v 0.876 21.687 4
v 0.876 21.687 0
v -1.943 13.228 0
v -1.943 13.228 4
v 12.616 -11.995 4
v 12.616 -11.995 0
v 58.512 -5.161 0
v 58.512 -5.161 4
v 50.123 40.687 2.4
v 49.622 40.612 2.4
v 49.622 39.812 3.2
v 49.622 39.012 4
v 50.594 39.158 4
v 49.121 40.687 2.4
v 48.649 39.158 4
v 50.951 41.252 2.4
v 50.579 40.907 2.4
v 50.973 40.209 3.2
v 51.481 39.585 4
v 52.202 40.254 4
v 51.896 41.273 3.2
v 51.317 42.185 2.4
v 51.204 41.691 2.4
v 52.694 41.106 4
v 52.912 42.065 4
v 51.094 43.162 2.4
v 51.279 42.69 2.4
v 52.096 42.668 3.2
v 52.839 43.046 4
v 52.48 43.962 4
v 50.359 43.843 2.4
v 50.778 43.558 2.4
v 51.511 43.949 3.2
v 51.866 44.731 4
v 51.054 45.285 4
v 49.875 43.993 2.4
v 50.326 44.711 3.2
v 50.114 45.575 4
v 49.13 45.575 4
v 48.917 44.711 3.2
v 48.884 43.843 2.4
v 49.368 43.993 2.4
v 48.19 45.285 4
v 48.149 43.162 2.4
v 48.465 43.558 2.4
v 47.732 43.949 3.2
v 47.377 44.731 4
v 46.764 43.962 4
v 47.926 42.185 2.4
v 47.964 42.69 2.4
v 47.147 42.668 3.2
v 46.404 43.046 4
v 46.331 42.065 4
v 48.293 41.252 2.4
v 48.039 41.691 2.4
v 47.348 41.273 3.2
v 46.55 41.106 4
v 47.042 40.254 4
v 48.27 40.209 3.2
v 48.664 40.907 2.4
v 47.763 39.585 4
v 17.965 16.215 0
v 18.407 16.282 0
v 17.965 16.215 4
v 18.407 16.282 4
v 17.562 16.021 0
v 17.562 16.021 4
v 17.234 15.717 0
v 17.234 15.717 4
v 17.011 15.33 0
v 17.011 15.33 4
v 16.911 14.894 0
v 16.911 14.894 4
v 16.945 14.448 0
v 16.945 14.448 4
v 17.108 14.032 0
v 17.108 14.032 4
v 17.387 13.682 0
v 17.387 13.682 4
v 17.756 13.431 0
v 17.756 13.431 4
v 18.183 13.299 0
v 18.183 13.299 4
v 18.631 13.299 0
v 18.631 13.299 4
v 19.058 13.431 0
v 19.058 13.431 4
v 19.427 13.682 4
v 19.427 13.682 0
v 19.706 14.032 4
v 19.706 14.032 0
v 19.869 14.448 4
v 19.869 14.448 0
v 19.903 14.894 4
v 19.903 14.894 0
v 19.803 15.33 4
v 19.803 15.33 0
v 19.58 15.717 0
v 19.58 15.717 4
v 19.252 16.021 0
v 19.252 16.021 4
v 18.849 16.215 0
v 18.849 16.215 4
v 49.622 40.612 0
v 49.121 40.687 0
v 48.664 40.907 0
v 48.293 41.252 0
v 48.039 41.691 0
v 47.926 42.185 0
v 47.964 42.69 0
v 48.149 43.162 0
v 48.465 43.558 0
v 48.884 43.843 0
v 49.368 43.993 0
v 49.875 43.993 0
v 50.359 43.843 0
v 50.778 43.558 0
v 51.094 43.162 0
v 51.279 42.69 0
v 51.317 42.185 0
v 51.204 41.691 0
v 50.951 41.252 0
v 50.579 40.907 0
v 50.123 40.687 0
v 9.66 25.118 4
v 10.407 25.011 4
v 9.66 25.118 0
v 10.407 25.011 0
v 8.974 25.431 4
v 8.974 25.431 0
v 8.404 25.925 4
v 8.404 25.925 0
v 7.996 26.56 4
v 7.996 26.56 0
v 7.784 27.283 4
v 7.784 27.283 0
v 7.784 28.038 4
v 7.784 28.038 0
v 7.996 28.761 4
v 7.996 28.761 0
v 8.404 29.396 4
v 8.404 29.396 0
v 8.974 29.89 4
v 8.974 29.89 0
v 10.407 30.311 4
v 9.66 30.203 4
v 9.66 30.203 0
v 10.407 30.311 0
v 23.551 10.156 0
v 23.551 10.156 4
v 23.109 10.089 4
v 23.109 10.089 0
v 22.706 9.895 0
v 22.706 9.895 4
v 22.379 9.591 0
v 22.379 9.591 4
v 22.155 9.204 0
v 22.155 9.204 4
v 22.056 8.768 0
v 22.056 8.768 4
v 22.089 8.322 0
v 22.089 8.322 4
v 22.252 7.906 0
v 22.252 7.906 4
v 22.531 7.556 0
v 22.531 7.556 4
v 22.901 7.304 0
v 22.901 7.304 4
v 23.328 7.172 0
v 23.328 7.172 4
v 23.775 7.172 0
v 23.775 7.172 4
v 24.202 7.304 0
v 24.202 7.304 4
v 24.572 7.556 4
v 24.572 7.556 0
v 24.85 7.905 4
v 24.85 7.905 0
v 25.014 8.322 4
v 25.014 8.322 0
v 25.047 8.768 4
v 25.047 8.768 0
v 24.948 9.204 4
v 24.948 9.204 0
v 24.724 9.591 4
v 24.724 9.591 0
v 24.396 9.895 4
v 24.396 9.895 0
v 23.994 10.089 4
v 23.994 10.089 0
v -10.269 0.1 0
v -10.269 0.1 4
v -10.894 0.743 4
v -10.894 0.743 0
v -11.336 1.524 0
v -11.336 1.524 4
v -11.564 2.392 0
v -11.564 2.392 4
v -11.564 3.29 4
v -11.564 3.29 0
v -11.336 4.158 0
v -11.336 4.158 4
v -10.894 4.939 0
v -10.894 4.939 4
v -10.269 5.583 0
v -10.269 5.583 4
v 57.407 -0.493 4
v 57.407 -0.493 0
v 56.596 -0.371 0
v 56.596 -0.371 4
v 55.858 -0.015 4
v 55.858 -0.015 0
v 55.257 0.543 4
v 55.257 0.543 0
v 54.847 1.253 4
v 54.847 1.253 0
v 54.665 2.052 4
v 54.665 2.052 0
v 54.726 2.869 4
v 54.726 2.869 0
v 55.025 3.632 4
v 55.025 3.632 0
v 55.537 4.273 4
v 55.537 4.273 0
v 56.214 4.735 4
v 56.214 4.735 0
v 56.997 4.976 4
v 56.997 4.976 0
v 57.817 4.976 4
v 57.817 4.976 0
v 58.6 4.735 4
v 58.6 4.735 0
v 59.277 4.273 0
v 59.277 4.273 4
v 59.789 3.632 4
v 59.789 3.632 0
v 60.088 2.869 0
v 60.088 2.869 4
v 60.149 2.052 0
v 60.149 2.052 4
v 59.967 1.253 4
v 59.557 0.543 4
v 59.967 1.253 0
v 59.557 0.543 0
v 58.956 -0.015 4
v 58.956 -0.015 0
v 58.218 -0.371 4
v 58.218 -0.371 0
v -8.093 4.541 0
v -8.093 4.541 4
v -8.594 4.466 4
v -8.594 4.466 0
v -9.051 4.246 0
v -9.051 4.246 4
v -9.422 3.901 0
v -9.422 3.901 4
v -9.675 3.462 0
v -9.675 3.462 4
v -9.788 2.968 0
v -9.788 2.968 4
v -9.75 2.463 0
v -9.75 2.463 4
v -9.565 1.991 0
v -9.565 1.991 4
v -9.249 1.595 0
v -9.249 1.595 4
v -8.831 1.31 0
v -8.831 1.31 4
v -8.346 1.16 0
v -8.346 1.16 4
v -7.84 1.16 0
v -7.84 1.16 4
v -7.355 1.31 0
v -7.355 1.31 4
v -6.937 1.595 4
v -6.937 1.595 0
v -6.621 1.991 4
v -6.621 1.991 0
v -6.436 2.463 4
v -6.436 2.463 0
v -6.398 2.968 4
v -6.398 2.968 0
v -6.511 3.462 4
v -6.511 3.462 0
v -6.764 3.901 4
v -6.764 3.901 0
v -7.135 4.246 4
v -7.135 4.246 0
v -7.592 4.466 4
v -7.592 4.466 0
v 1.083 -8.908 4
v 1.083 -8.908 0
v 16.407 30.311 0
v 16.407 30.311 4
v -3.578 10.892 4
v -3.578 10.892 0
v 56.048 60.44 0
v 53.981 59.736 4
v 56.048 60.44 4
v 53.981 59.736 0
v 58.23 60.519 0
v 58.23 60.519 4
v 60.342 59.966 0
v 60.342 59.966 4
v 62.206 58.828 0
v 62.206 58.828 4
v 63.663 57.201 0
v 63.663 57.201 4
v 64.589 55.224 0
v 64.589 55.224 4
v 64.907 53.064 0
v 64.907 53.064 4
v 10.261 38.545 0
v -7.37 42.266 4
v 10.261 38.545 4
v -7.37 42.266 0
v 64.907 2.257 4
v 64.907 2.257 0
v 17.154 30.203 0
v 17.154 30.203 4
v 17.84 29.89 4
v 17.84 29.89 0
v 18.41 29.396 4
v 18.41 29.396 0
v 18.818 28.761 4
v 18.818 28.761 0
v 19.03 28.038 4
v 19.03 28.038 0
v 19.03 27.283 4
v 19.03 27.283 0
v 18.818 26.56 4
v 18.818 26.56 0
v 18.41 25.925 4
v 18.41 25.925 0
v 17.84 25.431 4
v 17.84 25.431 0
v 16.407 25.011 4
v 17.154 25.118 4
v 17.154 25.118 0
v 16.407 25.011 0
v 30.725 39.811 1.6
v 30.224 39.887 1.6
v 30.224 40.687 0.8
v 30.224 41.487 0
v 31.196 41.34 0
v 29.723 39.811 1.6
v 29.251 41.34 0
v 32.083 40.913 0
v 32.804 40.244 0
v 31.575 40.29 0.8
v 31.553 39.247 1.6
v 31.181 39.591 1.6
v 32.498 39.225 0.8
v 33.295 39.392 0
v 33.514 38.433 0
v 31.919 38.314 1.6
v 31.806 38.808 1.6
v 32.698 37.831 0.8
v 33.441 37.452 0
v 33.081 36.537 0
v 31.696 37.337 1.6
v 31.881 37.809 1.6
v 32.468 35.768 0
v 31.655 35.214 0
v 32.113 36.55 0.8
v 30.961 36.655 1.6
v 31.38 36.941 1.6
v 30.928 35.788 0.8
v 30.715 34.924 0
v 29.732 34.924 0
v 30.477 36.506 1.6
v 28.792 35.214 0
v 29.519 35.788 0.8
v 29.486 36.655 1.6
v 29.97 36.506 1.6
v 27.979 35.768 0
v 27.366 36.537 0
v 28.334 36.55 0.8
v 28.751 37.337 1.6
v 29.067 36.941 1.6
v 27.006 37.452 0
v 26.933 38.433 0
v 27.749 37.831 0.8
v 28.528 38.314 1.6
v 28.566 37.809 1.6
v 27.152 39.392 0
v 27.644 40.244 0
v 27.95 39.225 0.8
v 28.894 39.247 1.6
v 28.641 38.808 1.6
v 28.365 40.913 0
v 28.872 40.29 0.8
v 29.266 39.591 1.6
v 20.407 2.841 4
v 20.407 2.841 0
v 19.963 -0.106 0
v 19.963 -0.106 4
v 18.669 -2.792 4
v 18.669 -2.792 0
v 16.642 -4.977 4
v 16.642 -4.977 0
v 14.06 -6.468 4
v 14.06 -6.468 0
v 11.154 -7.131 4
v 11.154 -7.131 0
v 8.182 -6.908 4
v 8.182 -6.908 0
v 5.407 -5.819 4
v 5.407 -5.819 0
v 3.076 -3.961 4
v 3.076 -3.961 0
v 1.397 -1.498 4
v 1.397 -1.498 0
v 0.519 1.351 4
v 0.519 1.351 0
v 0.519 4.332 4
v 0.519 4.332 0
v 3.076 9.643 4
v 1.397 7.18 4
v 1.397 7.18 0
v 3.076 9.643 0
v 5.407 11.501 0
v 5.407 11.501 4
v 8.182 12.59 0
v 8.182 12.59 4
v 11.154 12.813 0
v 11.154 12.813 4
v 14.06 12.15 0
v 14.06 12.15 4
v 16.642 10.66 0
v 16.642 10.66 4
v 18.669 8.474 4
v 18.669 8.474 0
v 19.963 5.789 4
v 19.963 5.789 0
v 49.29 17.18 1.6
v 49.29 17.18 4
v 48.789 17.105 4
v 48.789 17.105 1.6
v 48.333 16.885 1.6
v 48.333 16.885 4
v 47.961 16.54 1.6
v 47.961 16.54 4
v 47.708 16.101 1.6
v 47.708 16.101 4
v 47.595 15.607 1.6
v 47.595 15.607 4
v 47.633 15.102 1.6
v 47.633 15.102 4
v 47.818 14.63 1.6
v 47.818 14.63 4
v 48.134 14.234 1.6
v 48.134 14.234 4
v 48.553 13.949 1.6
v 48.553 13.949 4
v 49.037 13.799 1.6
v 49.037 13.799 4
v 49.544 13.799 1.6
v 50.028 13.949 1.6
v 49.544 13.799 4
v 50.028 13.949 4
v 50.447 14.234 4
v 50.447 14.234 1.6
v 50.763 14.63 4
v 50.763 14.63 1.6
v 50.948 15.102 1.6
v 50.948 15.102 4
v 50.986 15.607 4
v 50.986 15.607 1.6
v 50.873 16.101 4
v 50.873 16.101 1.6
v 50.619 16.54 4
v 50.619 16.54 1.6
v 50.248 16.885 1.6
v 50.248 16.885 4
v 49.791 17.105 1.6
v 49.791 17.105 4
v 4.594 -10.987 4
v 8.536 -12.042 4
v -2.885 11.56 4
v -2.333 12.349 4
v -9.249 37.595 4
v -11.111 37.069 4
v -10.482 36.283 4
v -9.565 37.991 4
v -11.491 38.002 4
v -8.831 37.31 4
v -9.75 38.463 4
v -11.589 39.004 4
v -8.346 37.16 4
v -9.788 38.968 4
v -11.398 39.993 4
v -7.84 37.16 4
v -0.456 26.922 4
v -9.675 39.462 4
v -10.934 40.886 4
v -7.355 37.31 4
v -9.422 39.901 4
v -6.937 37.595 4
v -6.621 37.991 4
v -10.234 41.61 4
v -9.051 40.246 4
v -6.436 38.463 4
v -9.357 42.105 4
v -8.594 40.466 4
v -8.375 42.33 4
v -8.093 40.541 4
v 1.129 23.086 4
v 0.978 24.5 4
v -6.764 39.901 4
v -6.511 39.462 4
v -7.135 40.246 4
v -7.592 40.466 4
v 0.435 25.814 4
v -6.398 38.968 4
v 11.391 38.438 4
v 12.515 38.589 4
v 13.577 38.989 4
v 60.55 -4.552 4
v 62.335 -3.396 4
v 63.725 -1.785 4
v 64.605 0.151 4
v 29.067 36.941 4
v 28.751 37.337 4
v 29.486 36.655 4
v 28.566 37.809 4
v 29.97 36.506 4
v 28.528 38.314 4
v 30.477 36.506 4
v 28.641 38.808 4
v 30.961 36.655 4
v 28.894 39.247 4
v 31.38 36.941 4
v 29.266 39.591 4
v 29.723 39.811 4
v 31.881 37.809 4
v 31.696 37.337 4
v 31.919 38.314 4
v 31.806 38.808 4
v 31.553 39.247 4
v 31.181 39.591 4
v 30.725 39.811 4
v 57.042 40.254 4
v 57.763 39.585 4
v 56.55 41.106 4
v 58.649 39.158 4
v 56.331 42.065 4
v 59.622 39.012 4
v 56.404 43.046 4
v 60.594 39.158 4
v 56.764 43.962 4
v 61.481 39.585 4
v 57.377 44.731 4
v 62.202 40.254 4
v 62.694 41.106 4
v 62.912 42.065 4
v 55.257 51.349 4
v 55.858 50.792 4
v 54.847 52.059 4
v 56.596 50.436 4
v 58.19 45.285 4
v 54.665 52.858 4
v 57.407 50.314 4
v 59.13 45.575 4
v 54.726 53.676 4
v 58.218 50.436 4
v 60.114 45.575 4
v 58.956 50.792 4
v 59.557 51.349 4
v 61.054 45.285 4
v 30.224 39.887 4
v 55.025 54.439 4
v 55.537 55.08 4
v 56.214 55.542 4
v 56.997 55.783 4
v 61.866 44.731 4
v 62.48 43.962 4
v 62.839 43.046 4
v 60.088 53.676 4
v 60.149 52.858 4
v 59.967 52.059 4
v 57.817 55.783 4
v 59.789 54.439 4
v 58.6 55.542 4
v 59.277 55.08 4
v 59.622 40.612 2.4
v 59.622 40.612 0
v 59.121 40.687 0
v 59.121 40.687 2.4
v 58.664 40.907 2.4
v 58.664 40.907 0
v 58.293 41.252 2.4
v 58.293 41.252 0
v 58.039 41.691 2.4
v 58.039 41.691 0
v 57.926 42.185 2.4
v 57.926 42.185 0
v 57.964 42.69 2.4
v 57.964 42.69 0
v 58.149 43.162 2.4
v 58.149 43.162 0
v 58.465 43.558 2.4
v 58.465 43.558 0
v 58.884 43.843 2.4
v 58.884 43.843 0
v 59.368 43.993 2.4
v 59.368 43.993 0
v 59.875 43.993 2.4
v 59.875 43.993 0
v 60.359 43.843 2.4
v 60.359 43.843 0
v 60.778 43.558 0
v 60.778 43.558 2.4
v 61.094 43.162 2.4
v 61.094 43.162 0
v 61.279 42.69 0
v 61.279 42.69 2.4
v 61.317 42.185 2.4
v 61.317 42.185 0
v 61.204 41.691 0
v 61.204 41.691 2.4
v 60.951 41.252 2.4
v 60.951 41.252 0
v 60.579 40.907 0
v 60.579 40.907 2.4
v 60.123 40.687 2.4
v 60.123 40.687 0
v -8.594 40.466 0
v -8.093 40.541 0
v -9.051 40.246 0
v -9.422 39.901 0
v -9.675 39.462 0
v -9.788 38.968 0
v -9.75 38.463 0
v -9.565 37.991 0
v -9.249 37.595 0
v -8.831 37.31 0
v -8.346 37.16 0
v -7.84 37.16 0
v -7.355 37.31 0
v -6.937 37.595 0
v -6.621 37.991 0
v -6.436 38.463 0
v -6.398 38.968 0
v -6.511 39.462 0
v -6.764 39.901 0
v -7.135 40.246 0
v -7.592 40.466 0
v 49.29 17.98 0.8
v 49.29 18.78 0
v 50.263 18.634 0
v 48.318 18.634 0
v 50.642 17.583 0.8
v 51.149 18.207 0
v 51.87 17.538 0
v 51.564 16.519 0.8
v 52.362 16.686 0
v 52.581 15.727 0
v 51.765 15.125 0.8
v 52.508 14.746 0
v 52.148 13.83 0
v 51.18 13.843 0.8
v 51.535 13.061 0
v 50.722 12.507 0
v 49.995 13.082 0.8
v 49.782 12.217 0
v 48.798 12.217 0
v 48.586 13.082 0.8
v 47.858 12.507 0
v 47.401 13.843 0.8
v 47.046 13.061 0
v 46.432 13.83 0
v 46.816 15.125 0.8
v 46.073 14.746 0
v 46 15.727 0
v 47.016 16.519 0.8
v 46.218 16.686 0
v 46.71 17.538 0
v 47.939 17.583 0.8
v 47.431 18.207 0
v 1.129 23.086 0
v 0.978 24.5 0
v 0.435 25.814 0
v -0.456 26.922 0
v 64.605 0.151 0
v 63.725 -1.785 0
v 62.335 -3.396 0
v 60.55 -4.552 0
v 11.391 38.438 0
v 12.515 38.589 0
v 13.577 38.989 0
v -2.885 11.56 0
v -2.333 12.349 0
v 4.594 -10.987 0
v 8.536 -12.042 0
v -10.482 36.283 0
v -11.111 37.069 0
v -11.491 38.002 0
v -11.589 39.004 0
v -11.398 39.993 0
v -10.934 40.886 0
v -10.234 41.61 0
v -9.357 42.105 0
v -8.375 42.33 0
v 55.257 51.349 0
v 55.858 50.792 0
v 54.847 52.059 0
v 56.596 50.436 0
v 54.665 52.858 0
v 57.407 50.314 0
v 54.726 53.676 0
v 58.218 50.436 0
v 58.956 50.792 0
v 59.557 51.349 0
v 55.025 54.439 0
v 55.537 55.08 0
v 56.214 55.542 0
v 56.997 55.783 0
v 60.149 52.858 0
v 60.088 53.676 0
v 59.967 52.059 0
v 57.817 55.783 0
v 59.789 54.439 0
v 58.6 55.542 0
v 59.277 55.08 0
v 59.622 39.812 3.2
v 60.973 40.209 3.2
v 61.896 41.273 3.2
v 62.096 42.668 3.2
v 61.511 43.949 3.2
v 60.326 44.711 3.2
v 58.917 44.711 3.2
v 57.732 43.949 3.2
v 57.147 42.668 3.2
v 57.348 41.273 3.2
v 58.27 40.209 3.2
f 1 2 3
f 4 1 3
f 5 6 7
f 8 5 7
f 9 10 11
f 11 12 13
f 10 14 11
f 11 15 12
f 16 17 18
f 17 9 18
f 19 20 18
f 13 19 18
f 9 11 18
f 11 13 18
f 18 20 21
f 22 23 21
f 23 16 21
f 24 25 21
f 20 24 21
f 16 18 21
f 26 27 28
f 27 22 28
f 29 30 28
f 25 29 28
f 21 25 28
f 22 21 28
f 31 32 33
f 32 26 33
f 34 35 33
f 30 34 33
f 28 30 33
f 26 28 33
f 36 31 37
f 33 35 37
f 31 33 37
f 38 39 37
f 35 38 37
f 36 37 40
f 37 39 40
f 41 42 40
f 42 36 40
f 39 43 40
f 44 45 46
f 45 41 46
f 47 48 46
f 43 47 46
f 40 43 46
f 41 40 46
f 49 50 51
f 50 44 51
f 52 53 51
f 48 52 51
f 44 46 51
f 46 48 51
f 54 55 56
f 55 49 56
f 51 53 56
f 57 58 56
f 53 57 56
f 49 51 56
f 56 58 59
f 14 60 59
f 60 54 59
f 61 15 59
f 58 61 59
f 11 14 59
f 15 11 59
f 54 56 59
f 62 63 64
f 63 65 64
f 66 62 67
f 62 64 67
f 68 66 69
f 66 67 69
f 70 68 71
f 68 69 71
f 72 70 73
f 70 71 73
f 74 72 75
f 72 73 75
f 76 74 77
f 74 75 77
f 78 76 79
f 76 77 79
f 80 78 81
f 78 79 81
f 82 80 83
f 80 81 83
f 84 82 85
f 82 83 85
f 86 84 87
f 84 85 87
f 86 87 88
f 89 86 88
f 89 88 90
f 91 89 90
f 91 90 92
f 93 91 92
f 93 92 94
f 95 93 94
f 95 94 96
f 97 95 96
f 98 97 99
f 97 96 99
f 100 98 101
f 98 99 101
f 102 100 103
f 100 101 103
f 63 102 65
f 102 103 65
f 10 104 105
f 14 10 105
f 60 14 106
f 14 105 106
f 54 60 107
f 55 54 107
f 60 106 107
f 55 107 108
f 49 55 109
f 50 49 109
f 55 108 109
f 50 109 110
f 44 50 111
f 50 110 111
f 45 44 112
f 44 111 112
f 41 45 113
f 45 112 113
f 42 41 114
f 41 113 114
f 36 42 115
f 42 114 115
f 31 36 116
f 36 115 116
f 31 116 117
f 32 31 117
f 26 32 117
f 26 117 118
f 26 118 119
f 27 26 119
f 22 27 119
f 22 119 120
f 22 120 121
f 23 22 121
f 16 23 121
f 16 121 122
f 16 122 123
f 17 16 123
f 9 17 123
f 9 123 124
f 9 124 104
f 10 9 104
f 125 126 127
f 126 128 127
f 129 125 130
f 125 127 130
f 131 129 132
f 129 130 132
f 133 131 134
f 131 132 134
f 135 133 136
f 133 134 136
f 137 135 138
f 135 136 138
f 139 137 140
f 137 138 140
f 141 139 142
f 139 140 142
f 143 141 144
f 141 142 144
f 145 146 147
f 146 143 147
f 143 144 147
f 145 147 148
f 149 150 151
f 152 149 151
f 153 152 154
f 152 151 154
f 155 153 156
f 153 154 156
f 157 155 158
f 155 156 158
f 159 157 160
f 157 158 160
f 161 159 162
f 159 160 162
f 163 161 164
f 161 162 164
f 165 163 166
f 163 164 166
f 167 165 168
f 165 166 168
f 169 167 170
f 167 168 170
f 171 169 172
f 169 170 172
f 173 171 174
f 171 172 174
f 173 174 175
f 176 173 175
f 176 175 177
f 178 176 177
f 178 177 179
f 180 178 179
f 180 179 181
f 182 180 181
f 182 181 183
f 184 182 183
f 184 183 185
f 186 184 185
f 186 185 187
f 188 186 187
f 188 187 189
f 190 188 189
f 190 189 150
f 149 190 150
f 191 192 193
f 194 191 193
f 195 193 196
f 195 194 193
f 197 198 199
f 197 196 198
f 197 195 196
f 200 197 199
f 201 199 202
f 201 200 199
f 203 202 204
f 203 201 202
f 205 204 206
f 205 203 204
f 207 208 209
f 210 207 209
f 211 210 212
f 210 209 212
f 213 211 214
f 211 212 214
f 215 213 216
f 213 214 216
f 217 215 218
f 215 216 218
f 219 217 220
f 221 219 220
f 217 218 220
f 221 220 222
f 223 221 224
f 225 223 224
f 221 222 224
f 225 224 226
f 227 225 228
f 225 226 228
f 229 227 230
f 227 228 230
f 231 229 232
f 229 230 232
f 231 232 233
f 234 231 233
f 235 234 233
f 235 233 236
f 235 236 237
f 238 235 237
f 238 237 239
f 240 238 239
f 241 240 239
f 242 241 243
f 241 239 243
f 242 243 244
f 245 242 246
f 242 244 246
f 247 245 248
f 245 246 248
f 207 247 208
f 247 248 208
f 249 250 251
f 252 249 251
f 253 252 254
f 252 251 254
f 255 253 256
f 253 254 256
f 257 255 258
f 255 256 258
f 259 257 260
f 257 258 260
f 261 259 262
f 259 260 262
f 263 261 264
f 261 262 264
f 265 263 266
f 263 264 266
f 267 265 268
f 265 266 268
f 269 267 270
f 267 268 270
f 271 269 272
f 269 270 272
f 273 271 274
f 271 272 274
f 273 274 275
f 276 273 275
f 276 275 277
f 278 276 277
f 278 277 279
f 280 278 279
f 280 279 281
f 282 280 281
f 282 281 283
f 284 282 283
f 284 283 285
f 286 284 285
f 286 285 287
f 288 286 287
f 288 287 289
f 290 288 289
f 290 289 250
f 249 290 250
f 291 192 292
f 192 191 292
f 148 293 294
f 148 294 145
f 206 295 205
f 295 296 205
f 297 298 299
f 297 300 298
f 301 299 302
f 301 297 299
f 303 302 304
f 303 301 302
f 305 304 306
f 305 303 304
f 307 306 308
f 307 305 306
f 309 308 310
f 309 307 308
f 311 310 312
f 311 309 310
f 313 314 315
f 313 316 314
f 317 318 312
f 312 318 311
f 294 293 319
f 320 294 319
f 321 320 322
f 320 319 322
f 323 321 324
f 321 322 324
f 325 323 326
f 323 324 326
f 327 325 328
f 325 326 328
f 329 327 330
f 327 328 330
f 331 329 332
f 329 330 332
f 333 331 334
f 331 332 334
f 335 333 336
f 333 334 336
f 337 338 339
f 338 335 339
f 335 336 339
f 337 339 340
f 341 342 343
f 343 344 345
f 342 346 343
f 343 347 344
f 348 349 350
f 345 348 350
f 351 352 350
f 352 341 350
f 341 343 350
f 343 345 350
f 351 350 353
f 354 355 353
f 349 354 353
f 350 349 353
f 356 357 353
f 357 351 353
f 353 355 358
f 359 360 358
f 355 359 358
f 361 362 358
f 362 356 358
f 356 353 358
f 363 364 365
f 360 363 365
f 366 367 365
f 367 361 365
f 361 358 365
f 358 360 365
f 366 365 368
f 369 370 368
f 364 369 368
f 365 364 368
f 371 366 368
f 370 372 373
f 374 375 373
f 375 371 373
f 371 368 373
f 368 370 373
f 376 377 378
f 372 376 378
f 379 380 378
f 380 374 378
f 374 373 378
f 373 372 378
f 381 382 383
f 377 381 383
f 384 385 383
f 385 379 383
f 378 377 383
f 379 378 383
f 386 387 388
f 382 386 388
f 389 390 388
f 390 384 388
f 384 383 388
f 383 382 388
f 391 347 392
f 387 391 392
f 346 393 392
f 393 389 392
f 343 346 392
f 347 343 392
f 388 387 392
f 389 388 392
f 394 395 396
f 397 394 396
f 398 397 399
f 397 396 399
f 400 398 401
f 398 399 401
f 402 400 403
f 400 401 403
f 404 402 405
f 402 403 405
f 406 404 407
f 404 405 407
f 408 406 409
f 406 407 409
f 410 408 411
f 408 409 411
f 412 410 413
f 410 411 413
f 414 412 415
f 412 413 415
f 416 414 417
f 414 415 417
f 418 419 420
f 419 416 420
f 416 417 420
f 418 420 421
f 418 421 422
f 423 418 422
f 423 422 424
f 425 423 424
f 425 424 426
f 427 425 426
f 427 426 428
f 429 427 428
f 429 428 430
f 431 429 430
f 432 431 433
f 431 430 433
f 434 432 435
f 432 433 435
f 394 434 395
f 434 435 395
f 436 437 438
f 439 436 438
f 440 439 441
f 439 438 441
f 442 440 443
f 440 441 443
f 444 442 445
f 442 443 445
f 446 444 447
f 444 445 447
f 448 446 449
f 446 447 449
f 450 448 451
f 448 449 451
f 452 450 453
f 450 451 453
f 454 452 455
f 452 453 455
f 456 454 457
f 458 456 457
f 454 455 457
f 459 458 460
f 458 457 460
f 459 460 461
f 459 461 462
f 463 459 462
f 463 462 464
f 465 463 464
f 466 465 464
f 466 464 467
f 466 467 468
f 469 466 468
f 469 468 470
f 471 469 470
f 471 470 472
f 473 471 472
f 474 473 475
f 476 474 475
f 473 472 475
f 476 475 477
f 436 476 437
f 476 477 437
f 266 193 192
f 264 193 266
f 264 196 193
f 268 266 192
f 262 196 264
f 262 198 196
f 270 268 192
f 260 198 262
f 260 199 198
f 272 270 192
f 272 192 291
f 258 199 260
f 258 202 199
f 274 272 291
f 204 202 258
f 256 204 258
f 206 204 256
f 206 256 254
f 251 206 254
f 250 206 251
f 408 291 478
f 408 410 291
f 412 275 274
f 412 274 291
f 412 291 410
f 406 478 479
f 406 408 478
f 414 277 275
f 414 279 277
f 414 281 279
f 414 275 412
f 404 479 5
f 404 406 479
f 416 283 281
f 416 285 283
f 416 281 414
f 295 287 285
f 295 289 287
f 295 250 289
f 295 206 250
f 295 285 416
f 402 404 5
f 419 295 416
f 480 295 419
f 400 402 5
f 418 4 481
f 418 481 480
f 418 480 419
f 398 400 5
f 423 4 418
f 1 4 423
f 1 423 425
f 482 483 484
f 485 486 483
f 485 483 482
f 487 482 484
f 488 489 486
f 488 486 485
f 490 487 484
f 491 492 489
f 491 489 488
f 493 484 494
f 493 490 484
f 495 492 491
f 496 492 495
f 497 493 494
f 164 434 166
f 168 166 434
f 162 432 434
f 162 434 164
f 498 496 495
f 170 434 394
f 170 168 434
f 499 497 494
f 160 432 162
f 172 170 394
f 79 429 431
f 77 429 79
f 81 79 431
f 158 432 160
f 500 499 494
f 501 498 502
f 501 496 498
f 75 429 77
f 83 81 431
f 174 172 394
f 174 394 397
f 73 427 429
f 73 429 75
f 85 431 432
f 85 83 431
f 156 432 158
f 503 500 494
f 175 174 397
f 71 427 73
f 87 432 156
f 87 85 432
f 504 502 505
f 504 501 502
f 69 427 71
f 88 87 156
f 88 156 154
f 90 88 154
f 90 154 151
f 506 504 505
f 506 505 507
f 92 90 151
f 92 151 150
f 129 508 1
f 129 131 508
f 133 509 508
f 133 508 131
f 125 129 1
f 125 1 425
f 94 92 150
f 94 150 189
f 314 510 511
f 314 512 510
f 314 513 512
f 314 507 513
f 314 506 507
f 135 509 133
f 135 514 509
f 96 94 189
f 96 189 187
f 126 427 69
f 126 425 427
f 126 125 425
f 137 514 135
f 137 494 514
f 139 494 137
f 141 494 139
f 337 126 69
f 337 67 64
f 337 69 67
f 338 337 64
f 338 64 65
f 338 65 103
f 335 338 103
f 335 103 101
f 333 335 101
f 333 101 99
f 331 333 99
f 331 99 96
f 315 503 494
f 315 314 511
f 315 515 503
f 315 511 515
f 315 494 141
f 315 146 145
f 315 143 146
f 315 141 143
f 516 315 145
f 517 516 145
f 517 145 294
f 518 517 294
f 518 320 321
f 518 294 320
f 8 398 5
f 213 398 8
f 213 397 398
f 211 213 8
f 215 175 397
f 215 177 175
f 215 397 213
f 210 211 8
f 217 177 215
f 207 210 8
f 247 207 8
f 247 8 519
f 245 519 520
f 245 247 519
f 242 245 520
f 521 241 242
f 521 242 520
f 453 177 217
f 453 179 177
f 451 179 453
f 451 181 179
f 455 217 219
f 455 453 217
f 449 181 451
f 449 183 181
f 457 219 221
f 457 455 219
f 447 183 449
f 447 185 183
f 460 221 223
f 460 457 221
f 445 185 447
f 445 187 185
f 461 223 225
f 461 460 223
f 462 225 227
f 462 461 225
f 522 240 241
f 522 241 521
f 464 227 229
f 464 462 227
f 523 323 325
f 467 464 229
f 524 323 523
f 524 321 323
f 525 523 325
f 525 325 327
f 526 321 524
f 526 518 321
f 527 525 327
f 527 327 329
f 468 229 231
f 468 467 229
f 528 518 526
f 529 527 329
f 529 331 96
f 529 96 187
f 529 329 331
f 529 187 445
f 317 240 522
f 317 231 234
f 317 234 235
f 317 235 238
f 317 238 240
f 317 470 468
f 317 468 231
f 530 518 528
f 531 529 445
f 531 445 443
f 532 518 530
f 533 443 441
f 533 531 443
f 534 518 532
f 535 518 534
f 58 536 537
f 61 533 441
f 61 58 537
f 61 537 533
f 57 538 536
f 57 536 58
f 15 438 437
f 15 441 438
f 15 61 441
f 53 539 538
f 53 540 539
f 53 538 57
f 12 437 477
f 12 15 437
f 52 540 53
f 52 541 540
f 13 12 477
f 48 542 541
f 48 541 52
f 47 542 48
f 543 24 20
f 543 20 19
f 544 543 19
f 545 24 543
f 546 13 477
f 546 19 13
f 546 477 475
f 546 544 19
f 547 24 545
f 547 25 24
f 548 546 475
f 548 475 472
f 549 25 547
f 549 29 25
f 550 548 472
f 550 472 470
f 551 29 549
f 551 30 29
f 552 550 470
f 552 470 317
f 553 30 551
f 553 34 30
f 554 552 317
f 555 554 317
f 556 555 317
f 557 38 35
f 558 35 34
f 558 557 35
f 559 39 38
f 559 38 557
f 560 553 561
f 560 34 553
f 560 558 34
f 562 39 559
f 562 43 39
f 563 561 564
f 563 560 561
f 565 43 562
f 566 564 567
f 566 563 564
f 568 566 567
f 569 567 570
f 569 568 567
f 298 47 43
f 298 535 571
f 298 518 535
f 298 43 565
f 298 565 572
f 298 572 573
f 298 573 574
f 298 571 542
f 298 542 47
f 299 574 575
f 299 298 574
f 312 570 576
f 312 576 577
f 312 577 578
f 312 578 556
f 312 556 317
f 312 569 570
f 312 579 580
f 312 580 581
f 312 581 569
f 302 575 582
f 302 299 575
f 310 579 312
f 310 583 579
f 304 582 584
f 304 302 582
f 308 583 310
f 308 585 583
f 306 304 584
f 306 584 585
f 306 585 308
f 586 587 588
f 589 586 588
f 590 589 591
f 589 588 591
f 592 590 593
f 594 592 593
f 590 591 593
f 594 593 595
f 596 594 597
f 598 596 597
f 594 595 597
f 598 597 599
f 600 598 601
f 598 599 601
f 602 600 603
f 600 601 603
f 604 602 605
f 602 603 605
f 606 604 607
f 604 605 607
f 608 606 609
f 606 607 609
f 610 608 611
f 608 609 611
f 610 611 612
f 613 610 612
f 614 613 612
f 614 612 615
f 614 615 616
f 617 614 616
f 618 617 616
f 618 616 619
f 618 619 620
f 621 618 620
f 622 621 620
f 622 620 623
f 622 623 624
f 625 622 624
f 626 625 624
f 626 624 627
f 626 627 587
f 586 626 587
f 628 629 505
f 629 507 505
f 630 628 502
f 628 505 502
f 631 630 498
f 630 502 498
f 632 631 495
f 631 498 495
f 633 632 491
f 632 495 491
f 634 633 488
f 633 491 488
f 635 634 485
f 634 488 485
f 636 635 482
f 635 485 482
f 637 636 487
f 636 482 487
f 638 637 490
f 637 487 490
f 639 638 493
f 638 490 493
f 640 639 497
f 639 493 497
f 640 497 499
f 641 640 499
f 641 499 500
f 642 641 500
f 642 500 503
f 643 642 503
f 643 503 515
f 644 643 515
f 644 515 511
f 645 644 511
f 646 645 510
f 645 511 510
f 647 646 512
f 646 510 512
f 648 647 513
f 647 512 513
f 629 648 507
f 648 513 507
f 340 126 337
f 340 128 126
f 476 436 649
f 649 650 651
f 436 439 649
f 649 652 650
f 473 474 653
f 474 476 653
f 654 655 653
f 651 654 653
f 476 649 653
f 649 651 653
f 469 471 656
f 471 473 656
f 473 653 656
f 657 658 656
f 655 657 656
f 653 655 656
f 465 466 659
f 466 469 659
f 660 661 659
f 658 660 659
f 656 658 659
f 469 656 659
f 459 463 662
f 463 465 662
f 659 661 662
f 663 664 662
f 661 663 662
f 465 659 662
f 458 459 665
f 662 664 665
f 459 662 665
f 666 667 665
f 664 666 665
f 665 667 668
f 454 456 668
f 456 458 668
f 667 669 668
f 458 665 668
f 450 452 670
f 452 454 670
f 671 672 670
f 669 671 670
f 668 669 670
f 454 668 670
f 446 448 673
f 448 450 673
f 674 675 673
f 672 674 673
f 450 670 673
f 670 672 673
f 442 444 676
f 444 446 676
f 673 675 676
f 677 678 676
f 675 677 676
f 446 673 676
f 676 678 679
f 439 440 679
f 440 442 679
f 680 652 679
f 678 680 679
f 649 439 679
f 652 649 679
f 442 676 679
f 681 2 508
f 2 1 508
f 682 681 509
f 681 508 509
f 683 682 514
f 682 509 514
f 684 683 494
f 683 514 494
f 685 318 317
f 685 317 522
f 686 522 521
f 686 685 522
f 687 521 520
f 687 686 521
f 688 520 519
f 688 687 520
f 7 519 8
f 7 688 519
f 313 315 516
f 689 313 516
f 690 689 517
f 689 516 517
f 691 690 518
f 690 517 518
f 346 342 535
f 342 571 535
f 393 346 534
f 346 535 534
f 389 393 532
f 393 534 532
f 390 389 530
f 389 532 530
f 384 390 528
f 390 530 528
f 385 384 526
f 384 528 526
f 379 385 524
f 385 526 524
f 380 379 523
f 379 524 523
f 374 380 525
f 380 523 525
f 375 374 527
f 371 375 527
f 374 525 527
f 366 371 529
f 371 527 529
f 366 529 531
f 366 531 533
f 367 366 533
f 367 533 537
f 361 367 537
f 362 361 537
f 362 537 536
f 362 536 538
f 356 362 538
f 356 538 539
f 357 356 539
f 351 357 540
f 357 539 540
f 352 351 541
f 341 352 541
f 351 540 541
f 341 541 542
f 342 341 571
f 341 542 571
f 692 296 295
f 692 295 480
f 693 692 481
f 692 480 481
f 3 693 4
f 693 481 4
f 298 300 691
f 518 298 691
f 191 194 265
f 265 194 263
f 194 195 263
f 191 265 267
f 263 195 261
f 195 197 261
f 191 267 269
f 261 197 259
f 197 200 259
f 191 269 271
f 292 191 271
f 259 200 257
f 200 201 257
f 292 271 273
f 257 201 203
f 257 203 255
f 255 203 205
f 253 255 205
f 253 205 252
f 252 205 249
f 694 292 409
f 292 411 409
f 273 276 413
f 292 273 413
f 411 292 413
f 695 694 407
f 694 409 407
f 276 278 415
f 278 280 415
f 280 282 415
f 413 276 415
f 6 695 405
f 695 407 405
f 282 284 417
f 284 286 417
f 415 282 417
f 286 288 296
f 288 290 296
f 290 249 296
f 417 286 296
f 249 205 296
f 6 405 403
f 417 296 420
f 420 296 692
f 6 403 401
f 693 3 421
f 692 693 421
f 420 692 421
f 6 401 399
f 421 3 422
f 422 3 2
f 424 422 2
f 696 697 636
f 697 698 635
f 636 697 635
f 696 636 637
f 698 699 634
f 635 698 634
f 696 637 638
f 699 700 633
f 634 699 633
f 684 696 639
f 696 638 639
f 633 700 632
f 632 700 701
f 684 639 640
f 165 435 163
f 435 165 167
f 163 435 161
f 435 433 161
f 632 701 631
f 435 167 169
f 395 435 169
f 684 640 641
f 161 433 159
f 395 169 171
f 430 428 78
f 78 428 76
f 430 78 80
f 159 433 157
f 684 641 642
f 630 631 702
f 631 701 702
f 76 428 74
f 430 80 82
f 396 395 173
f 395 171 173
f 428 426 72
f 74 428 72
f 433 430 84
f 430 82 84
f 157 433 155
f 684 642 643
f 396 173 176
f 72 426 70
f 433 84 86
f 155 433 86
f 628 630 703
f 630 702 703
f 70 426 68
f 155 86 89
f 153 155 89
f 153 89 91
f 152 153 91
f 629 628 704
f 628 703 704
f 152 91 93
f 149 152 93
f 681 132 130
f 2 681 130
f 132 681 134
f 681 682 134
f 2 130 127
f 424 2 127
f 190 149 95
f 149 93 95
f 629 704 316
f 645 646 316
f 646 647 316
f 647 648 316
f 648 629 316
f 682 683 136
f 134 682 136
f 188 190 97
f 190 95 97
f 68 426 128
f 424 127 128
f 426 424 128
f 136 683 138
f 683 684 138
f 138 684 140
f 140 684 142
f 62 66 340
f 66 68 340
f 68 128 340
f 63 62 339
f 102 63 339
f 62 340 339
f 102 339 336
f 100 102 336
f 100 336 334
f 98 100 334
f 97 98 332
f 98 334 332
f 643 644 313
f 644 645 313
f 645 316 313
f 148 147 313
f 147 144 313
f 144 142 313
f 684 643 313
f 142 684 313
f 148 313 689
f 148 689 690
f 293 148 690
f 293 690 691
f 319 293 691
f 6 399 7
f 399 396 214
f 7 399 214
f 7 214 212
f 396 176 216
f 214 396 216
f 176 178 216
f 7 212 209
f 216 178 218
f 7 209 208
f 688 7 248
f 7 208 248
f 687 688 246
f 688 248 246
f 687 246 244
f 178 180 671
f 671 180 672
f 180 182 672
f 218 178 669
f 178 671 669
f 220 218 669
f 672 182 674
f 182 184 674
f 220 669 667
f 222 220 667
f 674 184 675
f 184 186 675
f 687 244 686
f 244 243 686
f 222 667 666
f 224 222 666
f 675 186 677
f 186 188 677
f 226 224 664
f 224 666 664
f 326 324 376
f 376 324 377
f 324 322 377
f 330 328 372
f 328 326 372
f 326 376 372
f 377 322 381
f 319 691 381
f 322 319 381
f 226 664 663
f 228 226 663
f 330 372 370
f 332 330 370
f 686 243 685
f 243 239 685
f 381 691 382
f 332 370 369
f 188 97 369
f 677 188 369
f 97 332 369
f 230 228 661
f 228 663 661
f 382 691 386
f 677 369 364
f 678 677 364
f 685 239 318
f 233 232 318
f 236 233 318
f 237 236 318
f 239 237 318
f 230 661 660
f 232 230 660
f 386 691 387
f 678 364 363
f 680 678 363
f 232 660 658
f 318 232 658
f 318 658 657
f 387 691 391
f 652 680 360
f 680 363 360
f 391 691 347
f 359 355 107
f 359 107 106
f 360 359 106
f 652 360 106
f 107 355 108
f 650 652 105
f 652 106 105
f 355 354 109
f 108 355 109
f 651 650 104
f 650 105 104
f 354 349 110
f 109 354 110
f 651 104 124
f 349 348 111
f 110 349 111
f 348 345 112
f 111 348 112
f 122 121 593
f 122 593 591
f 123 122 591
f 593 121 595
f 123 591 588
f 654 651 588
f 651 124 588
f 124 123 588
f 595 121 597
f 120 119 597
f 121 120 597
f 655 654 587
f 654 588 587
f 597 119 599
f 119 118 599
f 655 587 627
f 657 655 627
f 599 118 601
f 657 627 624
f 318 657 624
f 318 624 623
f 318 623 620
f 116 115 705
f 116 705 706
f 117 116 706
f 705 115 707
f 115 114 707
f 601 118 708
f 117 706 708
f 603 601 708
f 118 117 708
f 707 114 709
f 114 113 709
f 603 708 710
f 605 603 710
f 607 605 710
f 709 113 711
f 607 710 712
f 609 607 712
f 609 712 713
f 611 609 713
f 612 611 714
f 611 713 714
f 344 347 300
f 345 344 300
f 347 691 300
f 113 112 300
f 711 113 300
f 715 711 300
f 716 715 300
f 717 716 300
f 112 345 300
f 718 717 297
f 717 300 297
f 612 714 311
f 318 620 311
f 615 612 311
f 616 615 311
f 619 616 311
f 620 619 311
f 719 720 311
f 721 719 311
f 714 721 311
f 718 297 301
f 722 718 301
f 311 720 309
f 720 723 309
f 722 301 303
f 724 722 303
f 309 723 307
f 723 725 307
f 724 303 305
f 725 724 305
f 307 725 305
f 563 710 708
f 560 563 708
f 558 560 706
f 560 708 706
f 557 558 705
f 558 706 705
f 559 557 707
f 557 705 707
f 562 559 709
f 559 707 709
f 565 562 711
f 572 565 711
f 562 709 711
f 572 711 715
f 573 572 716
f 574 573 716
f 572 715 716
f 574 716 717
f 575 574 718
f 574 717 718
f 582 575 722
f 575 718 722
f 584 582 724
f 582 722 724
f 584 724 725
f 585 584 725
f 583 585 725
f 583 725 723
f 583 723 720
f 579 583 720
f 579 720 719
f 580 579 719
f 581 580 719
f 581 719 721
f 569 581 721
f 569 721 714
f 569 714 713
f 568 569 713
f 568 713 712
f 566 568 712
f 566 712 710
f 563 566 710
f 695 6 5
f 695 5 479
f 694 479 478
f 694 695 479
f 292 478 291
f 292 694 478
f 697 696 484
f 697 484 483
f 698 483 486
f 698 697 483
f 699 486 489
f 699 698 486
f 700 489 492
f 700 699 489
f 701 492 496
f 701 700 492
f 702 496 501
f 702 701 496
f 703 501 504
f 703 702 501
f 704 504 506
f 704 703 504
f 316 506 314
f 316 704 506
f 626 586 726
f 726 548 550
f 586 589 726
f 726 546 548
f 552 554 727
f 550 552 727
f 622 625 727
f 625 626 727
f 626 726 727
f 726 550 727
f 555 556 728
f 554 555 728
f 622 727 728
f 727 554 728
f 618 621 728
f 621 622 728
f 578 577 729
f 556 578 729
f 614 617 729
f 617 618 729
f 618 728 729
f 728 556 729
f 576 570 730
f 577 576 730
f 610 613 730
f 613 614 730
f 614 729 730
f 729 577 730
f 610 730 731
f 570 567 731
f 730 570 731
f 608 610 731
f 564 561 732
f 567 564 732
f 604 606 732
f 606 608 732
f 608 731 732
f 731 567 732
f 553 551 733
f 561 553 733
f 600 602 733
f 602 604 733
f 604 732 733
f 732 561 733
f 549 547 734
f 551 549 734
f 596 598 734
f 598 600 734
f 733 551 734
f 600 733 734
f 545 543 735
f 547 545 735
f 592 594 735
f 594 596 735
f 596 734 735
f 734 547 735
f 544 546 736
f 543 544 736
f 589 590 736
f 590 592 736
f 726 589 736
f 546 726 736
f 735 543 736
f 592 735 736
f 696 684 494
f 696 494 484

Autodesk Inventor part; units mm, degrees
ref_plane "YZ Plane" through (0, 0, 0) normal (1, 0, 0) x (0, 1, 0)
ref_plane "XZ Plane" through (0, 0, 0) normal (0, 1, 0) x (-1, 0, 0)
ref_plane "XY Plane" through (0, 0, 0) normal (0, 0, 1) x (1, 0, 0)
sketch "Sketch1" plane through (0, 0, 0) normal (0, 0, 1) x (1, 0, 0)
  circle A0 centre (57.407, 53.064) radius 2.5 projected
  circle A1 centre (57.407, 53.064) radius 10 projected
  circle A2 centre (13.407, 27.6606) radius 2.5 projected
  circle A3 centre (13.407, 27.6606) radius 10 projected
  circle A4 centre (57.407, 2.2572) radius 2.5 projected
  circle A5 centre (57.407, 2.2572) radius 10 projected
  line L0 (25.407, -164.9104) -> (25.407, 85.0896) construction
  arc A6 (64.907, 53.064) -> (53.9811, 59.7359) centre (57.407, 53.064) ccw
  arc A7 (58.5116, -5.161) -> (64.907, 2.2572) centre (57.407, 2.2572) ccw
  line L1 (10.407, 27.6606) -> (16.407, 27.6606) construction
  line L2 (10.407, 25.0106) -> (16.407, 25.0106)
  line L3 (16.407, 30.3106) -> (10.407, 30.3106)
  arc A8 (10.407, 30.3106) -> (10.407, 25.0106) centre (10.407, 27.6606) ccw
  arc A9 (16.407, 25.0106) -> (16.407, 30.3106) centre (16.407, 27.6606) ccw
  circle A10 centre (10.407, 2.8412) radius 10
  arc A11 (-3.8238, 7.5832) -> (12.6162, -11.9952) centre (10.407, 2.8412) ccw
  line L4 (12.6162, -11.9952) -> (58.5116, -5.161)
  line L5 (53.9811, 59.7359) -> (8.8392, 36.5564)
  line L6 (64.907, 2.2572) -> (64.907, 53.064)
  line L7 (3.9198, 30.8219) -> (-3.8238, 7.5832)
  line L8 (-3.8238, 7.5832) -> (-11.5466, -15.5932) construction
  line L9 (12.6162, -11.9952) -> (-11.5466, -15.5932) construction
  line L10 (-11.5466, -15.5932) -> (31.917, 20.9033) construction
  line L11 (-8.093, 51.8526) -> (-8.093, -0.1388) construction
  circle A12 centre (-8.093, 38.8412) radius 3.5 construction
  circle A13 centre (-8.093, 2.8412) radius 3.5 construction
  line L12 (-20.593, 53.8412) -> (-4.593, 53.8412) construction
  line L13 (-4.593, 53.8412) -> (-4.593, -12.1588) construction
  line L14 (-4.593, -12.1588) -> (-20.593, -12.1588) construction
  line L15 (-20.593, -12.1588) -> (-20.593, 53.8412) construction
  line L16 (-20.593, 20.8412) -> (-4.593, 20.8412) construction
  line L17 (-2.413, 11.817) -> (-10.2687, 5.5829)
  line L18 (-10.2687, 0.0996) -> (1.0826, -8.9085)
  arc A14 (-4.593, -1.7035) -> (-4.0348, -1.2128) centre (-8.093, 2.8412) ccw
  arc A15 (-10.2687, 5.5829) -> (-10.2687, 0.0996) centre (-8.093, 2.8412) ccw
  line L19 (1.8905, 24.7319) -> (-10.4816, 36.2829)
  line L20 (-7.3703, 42.2658) -> (11.9978, 38.1783)
  arc A16 (-7.3703, 42.2658) -> (-10.4816, 36.2829) centre (-8.093, 38.8412) ccw
  point P0 (18.407, 14.782)
  point P1 (23.5514, 8.6555)
  dimension "d52" = 15
  dimension "d53" = 15
  dimension "d54" = 3
  dimension "d55" = 5.3
  dimension "d56" = 20
  dimension "d57" = 30
  dimension "d58" = 4
  dimension "d59" = 8
  dimension "d93" = 7
  dimension "d94" = 7
  dimension "d95" = 36
  dimension "d96" = 16
  dimension "d97" = 66
  dimension "d99" = 3.5
extrude "Extrusion1" add sketch "Sketch1" along normal blind 4 contours A0 | L5 A6 L6 A1 | A1 L6 A5 L4 A11 L7 A3 L5 | L5 A3 L7 L19 A16 L20 | L6 A7 L4 A5 | A3 | L18 A15 L17 L7 A11 | A4 picked at (52.4239, 56.8921) picked at (55.6672, -3.7922)
sketch "Sketch2" plane through (0, 0, 4) normal (0, 0, 1) x (1, 0, 0)
  circle A0 centre (13.407, 27.6606) radius 2.5 projected
  circle A1 centre (57.407, 2.2572) radius 2.5 projected
  circle A2 centre (57.407, 53.064) radius 2.5 projected
  line L0 (10.407, 27.6606) -> (16.407, 27.6606) construction
  line L1 (10.407, 24.9106) -> (16.407, 24.9106)
  line L2 (16.407, 30.4106) -> (10.407, 30.4106)
  arc A3 (10.407, 30.4106) -> (10.407, 24.9106) centre (10.407, 27.6606) ccw
  arc A4 (16.407, 24.9106) -> (16.407, 30.4106) centre (16.407, 27.6606) ccw
  point P0 (0, 0)
  dimension "d25" = 3
  dimension "d26" = 5.5
hole "Hole2" at (57.407, 53.064, 4) at (57.407, 2.2572, 4) direction (0, 0, -1) diameter 5.5 end through all clearance for "Countersunk Head GOST 12876-67" size "M5" standard "GOST"
hole "Hole4" at (18.407, 14.782, 0) at (23.5514, 8.6555, 0) direction (0, 0, 1) diameter 3 end through all
sketch "Sketch6" plane through (0, 0, 0) normal (0, 0, -1) x (-1, 0, 0)
  circle A0 centre (-49.2903, 15.4803) radius 1.7 projected
  circle A1 centre (-30.2236, 38.1868) radius 1.7 projected
  point P0 (0, 0)
hole "Hole6" at (49.2903, 15.4803, 0) at (30.2236, 38.1868, 0) direction (0, 0, 1) diameter 3.4 end through all countersink diameter 6.6 countersink angle 90 clearance for "Countersunk Head GOST 12876-67" size "M3" standard "GOST"
sketch "Sketch7" plane through (0, 0, 4) normal (0, 0, 1) x (1, 0, 0)
  point P0 (0, 0)
  point P1 (49.6217, 42.3118)
  point P2 (59.6217, 42.3118)
hole "Hole7" at (59.6217, 42.3118, 4) at (49.6217, 42.3118, 4) direction (0, 0, -1) diameter 3.4 end through all countersink diameter 6.6 countersink angle 90 clearance for "Countersunk Head GOST 12876-67" size "M3" standard "GOST"
hole "Hole8" at (-8.093, 2.8412, 0) at (-8.093, 38.8412, 0) direction (0, 0, 1) diameter 3.4 end through all clearance for "Hex Head Bolt / Nut GOST 12876-67" size "M3" standard "GOST"
fillet "Fillet2" radius 5 3 edges at (-2.413, 11.817, 2) (1.8905, 24.7319, 2) (11.9978, 38.1783, 2)
properties part number "plate_3"
